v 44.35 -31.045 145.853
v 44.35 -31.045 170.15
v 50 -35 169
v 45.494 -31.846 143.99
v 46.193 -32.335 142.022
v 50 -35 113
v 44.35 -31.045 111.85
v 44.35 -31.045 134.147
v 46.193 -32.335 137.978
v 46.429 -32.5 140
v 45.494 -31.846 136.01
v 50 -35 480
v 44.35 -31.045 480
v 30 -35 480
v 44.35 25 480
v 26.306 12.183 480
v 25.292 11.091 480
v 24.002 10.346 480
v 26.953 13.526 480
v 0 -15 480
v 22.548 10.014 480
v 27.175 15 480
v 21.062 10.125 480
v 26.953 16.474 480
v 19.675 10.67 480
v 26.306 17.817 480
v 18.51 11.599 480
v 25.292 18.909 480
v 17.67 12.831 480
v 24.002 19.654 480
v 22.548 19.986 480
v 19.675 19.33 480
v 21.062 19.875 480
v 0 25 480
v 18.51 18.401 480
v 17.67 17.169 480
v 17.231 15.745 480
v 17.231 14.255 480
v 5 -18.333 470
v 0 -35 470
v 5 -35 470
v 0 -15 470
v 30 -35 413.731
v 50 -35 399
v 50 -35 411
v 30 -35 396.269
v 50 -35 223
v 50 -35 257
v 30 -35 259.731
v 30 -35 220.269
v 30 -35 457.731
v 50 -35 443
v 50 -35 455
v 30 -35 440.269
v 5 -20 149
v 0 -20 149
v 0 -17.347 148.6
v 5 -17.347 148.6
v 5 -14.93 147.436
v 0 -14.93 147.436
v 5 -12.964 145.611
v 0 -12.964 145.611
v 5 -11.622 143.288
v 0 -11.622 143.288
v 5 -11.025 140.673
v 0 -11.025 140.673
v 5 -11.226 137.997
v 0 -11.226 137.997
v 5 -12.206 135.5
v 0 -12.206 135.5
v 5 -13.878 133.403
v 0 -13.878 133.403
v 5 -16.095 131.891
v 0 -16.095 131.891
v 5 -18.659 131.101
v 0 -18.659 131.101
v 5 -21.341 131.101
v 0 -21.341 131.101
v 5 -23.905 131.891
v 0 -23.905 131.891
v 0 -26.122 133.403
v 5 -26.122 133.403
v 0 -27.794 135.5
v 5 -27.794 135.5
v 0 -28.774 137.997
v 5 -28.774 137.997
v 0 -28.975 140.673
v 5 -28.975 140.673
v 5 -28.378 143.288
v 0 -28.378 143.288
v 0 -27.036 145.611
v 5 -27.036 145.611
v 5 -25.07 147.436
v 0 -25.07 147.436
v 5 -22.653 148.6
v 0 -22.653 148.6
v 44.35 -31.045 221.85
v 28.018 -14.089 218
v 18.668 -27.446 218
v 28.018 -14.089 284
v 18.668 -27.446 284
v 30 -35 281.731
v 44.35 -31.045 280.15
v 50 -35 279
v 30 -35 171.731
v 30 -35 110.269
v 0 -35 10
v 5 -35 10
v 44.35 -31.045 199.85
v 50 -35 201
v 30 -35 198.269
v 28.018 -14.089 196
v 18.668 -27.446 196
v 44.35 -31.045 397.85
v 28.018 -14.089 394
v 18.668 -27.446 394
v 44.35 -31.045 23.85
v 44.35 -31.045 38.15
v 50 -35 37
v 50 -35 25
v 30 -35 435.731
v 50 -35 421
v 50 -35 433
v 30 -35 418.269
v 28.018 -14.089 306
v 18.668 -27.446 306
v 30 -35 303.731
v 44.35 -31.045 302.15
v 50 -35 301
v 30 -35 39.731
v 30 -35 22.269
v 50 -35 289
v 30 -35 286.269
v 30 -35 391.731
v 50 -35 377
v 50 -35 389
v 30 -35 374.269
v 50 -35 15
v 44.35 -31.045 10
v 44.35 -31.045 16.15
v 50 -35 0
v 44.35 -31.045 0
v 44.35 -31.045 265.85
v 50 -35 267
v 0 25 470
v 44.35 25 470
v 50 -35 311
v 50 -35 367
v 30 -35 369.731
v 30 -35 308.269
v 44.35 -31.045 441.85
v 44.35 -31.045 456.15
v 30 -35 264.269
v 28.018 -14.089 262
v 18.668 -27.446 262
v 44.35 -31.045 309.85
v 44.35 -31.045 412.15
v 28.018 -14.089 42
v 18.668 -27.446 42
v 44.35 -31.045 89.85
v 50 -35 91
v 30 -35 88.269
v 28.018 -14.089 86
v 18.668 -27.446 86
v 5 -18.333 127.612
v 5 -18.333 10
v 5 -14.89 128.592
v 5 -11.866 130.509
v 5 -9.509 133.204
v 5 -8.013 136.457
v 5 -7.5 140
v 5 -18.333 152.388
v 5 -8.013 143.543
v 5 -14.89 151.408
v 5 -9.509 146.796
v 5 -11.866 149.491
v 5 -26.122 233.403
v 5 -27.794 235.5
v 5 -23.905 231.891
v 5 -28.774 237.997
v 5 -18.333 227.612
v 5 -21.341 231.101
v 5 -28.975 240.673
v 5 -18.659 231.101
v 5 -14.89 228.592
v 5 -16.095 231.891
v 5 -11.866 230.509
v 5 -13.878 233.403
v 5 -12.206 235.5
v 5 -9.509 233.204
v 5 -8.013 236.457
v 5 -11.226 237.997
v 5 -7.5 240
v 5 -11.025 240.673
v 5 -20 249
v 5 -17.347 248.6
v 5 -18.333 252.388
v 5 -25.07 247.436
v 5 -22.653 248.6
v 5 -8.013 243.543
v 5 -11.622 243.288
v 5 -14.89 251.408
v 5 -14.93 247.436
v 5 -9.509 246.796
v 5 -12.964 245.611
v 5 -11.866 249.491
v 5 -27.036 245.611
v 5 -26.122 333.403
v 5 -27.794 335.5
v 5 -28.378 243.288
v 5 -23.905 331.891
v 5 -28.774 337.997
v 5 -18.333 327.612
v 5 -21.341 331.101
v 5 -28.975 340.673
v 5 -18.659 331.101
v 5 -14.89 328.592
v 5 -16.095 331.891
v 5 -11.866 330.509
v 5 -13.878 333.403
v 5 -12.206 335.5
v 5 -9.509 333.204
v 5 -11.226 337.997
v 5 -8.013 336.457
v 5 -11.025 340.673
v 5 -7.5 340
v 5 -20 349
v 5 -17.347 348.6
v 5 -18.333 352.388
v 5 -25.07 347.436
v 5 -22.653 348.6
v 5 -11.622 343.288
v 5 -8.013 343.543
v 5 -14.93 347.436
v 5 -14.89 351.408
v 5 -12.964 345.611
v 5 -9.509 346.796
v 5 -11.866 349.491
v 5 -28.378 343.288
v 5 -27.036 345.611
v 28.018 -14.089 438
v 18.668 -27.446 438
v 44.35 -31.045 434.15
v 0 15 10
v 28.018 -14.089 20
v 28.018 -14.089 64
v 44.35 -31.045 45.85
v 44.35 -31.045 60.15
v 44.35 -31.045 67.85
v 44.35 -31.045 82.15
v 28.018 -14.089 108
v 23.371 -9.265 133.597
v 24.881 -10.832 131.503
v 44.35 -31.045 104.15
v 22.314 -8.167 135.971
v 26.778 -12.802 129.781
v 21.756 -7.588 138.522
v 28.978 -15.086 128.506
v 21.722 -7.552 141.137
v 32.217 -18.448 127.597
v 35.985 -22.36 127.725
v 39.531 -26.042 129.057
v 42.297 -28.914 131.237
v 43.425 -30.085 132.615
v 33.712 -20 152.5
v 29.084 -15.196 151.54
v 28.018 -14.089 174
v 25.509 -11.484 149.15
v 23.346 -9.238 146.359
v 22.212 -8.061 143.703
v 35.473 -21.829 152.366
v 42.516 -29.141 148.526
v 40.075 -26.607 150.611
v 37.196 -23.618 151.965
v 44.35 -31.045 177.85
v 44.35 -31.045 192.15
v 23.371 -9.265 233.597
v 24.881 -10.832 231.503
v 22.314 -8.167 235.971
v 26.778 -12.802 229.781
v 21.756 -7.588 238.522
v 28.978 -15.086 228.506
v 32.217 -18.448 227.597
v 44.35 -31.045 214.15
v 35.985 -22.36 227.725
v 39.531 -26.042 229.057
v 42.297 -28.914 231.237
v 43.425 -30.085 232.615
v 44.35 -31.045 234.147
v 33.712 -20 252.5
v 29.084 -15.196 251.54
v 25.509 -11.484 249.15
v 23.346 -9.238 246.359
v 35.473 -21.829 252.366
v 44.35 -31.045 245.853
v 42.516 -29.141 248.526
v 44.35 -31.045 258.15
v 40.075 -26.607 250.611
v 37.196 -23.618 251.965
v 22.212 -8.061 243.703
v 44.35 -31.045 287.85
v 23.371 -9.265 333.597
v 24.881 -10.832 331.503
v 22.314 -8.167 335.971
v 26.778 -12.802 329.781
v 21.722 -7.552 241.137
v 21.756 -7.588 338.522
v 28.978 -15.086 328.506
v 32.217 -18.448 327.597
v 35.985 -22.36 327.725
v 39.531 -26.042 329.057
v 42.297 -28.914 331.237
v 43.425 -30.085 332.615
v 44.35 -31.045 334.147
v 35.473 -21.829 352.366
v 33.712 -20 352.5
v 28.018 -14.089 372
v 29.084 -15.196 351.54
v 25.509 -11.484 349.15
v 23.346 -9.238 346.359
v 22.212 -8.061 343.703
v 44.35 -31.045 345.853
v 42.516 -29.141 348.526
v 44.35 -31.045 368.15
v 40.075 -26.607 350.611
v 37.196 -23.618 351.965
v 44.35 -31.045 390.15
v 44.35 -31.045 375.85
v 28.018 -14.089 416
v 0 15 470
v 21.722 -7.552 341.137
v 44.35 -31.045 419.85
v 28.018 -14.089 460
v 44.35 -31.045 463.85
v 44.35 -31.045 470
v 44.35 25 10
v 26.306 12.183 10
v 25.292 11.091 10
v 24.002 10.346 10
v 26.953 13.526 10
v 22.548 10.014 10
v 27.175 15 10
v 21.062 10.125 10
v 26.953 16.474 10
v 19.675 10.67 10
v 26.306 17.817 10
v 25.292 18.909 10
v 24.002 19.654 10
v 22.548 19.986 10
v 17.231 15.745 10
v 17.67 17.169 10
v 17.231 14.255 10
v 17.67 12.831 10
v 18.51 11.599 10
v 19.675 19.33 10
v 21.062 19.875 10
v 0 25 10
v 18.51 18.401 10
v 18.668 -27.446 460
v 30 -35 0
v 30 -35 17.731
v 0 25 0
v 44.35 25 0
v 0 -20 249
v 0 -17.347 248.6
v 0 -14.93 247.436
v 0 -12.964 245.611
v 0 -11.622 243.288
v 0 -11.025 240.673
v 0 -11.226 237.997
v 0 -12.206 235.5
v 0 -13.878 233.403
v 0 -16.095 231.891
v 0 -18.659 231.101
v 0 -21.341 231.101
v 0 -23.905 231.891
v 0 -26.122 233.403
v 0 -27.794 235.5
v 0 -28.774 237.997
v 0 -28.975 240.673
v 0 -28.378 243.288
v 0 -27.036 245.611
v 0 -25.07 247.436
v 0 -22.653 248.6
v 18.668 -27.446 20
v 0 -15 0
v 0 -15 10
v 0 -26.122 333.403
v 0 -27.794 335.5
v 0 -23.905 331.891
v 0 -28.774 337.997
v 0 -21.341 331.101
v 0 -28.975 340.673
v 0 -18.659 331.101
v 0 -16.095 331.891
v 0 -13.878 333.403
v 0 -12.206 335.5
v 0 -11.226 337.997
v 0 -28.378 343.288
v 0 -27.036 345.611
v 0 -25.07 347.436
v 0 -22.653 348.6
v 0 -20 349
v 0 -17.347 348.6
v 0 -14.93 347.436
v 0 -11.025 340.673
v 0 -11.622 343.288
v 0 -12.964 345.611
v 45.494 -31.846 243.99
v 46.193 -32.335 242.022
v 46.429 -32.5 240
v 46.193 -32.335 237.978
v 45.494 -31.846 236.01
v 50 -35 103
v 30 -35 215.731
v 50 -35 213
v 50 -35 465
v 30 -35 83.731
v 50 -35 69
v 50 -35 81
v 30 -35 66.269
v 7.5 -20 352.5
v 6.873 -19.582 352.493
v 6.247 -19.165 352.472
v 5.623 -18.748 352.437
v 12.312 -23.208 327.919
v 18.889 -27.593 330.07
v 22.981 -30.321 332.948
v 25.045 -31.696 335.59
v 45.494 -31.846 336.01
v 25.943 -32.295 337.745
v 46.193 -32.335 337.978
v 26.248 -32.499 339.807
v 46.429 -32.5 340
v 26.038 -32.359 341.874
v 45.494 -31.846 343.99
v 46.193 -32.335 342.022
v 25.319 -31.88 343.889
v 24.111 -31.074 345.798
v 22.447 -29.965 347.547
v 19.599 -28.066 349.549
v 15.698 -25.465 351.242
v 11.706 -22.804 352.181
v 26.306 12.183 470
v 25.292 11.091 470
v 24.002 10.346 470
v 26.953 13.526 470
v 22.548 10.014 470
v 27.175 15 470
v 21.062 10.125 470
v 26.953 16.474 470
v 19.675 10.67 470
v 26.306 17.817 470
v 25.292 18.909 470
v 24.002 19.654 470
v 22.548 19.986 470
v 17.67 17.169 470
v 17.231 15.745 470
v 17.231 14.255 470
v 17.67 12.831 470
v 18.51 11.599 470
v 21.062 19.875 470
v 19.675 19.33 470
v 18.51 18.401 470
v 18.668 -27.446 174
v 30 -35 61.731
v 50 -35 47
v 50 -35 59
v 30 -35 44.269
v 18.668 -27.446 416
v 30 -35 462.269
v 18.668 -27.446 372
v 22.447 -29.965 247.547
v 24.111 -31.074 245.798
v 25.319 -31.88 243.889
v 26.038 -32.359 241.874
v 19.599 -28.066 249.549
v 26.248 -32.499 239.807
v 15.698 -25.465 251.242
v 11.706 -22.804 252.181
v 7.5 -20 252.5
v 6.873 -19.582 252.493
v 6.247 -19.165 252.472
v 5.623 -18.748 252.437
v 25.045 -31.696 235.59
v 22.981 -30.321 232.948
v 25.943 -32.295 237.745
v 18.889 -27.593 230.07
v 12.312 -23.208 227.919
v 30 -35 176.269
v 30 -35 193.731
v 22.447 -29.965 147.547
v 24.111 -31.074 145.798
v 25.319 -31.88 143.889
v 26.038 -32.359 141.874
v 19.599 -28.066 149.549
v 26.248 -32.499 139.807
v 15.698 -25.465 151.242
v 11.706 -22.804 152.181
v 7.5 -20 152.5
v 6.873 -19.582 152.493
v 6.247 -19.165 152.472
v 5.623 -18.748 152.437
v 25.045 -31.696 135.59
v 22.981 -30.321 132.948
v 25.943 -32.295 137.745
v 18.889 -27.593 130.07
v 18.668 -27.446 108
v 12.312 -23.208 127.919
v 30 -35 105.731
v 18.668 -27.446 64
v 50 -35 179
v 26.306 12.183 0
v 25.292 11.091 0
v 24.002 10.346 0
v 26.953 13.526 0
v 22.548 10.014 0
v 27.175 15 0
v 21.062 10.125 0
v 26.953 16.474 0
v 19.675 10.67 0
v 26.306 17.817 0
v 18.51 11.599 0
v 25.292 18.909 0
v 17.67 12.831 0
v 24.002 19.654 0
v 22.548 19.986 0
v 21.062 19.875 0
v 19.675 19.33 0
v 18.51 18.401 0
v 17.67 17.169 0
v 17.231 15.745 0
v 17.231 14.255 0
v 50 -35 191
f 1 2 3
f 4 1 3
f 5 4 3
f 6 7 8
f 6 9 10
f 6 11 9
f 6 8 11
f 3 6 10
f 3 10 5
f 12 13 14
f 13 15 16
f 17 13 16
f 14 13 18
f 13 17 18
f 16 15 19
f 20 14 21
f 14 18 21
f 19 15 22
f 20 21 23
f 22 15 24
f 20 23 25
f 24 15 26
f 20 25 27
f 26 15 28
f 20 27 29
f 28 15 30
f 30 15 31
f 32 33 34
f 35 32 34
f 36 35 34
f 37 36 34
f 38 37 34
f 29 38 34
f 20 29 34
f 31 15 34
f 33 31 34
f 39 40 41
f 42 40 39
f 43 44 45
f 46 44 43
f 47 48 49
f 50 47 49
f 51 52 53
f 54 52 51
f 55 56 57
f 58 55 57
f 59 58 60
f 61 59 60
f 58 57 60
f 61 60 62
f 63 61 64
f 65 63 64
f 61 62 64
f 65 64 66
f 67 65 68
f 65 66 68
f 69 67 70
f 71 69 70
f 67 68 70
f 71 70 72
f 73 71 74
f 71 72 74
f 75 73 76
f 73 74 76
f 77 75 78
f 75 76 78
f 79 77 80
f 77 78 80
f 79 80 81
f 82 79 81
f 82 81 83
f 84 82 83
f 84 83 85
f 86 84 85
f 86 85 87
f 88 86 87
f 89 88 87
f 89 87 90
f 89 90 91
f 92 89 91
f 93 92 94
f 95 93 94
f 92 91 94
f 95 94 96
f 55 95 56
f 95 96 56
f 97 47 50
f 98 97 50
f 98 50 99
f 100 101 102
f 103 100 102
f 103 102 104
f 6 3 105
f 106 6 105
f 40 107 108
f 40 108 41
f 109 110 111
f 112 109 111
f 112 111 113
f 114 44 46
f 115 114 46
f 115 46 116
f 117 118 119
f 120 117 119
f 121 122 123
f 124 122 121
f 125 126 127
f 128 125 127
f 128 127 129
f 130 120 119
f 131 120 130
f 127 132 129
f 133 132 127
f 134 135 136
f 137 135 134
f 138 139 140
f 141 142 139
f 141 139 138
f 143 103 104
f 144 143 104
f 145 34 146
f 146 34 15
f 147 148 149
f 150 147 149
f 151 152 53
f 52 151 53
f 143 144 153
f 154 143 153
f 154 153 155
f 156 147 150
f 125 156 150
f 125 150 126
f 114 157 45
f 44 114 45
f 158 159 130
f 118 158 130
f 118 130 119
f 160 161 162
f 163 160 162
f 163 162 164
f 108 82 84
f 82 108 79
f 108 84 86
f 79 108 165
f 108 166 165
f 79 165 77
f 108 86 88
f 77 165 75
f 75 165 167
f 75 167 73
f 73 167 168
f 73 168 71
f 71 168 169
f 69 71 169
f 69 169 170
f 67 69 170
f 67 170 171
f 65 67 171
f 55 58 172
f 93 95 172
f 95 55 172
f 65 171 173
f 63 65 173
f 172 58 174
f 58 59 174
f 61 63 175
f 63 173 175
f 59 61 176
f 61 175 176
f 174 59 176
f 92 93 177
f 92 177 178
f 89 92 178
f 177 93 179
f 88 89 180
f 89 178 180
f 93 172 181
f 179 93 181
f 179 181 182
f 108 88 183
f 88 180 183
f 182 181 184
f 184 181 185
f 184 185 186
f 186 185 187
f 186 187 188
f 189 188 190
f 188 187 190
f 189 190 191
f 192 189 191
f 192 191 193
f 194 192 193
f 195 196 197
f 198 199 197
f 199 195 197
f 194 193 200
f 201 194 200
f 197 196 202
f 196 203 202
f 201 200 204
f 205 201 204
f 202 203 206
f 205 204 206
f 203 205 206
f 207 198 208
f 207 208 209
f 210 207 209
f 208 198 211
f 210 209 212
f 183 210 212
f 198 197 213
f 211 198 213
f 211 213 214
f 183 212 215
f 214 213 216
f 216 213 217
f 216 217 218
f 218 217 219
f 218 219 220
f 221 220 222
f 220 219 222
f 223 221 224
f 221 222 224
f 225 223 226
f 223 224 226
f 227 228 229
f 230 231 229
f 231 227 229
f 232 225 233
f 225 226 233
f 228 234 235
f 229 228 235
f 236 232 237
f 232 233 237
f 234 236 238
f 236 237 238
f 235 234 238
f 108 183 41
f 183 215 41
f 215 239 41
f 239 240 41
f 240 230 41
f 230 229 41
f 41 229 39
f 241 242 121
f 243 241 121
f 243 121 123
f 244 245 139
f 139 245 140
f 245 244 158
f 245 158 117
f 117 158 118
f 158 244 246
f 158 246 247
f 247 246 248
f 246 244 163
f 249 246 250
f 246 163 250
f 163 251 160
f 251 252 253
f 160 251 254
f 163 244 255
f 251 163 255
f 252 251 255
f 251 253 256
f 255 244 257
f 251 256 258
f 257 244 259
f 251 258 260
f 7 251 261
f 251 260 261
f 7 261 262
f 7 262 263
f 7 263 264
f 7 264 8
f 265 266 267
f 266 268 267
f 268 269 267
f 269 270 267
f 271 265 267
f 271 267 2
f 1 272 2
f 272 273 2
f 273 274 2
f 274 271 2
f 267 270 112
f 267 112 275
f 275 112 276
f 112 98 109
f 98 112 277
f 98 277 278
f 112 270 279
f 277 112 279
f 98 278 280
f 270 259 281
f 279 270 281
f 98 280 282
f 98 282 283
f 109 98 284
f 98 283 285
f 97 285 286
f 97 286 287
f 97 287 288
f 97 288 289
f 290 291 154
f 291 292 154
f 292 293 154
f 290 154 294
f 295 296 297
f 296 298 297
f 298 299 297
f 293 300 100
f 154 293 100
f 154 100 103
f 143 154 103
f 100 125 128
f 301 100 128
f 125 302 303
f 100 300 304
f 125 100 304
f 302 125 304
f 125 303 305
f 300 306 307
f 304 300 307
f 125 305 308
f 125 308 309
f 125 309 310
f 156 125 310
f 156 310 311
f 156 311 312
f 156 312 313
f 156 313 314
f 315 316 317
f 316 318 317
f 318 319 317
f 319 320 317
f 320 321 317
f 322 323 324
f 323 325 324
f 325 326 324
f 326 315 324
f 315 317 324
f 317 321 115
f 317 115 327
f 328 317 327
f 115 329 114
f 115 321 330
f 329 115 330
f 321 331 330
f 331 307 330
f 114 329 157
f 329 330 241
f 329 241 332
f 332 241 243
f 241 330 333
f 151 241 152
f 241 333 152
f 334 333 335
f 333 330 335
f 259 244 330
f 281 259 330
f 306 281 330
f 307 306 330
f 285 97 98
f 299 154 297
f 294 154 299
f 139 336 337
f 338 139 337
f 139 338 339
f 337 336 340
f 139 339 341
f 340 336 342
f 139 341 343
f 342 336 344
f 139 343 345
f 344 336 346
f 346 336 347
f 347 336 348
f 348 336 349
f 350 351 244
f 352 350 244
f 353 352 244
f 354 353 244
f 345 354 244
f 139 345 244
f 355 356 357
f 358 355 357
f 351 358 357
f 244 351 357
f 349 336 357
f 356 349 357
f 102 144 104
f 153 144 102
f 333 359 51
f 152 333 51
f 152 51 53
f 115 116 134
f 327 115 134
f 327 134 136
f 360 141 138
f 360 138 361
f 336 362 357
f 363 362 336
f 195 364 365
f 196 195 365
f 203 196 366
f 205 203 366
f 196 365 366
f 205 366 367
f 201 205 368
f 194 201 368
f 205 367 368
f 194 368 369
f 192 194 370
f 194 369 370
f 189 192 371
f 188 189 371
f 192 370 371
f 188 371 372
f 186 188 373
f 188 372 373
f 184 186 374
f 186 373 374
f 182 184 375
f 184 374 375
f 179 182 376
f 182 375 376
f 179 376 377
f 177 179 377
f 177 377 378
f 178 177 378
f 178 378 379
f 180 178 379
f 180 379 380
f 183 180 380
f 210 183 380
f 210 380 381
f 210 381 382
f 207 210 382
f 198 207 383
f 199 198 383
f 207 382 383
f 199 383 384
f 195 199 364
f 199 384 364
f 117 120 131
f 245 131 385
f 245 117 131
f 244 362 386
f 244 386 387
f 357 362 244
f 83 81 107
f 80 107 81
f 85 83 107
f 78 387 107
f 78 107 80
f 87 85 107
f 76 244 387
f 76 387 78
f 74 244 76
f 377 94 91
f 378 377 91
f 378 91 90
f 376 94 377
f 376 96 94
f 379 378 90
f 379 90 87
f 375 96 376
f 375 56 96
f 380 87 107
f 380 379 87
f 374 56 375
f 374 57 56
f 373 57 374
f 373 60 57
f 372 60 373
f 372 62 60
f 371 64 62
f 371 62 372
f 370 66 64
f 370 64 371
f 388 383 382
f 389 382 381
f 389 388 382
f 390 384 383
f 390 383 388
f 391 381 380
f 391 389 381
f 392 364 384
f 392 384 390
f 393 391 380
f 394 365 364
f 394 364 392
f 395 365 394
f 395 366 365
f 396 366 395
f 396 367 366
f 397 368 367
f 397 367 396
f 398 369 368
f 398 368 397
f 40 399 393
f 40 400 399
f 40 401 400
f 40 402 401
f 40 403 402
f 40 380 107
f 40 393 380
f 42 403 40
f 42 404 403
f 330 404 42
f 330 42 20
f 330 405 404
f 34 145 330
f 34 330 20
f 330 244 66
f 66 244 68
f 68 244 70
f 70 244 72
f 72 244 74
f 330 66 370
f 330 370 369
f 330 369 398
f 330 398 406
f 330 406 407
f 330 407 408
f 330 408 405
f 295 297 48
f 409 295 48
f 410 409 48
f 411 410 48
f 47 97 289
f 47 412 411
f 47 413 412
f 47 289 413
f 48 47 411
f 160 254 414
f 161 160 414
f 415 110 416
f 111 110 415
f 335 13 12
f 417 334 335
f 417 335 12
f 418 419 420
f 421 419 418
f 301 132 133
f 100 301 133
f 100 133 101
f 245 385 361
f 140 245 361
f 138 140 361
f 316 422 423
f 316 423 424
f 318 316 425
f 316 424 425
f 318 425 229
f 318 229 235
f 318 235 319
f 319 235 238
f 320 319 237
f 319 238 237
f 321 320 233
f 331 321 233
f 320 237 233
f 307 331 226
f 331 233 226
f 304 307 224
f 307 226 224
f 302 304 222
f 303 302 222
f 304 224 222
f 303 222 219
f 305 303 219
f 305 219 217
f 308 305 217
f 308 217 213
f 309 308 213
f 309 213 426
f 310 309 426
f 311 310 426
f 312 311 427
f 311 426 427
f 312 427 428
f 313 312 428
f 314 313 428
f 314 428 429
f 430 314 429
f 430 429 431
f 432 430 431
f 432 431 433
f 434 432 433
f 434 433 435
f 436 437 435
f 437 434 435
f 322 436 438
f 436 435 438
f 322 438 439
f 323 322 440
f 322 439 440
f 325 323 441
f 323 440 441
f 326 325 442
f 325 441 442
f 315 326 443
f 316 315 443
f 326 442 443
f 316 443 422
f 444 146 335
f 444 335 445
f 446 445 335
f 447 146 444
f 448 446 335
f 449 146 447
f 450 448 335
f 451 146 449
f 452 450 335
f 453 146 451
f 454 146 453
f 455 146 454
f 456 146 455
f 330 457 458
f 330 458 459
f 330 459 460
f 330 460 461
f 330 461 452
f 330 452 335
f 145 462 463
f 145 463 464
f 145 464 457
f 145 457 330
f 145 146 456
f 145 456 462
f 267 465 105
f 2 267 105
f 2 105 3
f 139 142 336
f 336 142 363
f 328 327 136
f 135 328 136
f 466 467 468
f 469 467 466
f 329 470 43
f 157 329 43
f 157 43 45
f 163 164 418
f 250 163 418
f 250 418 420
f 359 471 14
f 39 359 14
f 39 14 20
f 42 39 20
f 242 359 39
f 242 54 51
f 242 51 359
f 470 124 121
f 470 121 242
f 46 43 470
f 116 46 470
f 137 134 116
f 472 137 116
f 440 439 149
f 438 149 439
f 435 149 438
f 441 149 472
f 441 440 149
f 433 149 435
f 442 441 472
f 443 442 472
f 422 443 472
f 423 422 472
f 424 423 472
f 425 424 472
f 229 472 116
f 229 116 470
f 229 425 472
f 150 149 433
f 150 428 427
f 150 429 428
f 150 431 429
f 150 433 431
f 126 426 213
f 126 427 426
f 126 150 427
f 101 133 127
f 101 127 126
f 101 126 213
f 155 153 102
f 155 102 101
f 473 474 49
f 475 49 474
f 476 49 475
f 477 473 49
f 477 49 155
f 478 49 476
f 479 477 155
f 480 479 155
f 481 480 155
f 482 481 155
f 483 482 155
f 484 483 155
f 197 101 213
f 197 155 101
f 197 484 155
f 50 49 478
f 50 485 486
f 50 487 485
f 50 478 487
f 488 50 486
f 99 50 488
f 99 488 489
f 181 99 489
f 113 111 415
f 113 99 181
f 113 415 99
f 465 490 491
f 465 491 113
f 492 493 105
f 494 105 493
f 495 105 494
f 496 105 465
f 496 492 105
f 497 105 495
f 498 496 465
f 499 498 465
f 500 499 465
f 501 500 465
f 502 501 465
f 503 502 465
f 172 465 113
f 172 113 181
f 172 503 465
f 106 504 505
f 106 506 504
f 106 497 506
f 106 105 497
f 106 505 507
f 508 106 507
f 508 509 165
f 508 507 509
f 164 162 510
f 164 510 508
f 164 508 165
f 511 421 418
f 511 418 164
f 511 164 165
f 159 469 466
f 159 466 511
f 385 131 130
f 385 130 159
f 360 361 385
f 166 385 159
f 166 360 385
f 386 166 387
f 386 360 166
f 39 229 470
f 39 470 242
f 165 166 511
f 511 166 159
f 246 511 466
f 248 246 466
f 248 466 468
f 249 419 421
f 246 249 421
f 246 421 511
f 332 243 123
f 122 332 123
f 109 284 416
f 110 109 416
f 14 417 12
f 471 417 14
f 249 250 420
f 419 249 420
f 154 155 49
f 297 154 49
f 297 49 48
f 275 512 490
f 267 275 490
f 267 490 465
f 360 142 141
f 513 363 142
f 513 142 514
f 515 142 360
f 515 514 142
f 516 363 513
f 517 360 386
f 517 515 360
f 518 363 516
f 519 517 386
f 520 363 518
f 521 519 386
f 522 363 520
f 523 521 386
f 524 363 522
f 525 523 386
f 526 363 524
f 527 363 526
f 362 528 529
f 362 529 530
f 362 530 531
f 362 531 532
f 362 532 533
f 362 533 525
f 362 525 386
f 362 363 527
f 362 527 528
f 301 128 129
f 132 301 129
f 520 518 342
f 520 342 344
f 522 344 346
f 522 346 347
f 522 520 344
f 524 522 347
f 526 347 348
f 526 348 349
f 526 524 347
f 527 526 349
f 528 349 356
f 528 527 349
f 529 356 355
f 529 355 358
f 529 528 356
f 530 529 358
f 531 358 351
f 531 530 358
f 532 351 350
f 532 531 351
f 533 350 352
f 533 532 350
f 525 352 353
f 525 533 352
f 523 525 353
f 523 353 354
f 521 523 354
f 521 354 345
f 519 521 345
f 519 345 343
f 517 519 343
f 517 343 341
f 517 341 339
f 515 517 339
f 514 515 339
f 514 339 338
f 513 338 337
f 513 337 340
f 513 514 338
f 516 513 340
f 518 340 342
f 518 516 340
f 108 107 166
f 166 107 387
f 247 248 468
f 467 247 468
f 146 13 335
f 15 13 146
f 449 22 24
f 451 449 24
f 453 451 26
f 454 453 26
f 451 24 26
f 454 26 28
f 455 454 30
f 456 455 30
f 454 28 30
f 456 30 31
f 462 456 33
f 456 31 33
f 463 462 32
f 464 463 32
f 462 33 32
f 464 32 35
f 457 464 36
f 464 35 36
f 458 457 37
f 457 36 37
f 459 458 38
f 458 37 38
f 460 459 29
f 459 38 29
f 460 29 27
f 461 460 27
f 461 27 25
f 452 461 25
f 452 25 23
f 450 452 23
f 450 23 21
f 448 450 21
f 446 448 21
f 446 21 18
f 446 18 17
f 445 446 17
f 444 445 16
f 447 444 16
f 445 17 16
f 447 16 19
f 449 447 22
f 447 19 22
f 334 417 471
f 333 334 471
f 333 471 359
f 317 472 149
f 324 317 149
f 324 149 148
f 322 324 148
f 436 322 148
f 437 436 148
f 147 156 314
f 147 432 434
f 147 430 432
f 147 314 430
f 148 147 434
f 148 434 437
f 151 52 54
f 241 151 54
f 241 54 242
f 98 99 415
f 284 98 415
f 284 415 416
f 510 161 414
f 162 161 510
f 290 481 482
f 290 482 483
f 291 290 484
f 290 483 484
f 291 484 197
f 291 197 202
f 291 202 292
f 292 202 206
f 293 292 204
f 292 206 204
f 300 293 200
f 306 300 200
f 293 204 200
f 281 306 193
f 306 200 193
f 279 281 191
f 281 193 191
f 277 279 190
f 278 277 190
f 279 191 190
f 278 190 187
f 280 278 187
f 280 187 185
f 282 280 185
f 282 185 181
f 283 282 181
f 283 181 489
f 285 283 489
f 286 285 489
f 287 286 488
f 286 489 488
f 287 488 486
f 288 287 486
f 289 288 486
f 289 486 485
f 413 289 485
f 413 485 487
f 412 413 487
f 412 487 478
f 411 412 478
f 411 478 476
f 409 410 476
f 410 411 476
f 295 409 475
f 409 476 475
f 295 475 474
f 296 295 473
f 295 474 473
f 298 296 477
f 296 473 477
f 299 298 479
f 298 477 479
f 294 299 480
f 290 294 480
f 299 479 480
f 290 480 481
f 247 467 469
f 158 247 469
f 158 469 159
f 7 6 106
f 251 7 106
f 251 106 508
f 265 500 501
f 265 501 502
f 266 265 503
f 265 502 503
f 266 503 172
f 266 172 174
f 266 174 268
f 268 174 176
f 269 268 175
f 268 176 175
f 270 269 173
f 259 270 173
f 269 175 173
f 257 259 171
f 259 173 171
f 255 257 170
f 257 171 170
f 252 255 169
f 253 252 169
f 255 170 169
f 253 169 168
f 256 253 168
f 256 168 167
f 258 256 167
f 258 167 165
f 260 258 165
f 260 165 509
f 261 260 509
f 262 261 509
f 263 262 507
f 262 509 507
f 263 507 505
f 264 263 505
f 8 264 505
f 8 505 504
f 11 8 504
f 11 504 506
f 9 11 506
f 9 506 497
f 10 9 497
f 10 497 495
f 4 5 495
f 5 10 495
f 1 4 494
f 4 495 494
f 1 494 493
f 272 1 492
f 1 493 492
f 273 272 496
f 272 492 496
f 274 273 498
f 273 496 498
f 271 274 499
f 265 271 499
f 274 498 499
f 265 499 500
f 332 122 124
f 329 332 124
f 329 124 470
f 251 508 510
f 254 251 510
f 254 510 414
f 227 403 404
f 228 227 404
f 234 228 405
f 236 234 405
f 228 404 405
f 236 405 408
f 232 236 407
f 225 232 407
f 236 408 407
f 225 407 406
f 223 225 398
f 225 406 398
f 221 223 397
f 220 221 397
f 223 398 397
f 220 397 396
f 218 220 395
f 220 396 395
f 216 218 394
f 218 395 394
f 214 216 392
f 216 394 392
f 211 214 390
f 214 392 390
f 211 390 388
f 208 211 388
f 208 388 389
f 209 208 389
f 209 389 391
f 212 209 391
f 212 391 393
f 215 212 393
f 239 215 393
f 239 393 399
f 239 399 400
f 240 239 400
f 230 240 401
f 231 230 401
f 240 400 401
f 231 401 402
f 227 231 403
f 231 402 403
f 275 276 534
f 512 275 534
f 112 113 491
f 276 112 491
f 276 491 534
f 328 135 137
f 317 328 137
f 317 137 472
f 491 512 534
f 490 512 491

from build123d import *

# Parameters (mm, degrees)
BOSS_EXTRUDE1_DEPTH = 480
SKETCH2_R           = 5
BOSS_EXTRUDE2_DEPTH = 10
BOSS_EXTRUDE3_REACH = 482
CUT_EXTRUDE9_DEPTH  = 28
SKETCH14_W          = 460
SKETCH14_H          = 35
BOSS_EXTRUDE6_DEPTH = 5
SKETCH7_R           = 12.5
CUT_EXTRUDE8_DEPTH  = 56
SKETCH15_R          = 12.5
SKETCH15_R_2        = 9
BOSS_EXTRUDE7_DEPTH = 5


with BuildPart() as part:
    # Sketch1 → Boss-Extrude1 (new body)
    with BuildSketch(Plane.XY):
        Polygon((0, 0), (50, -35), (30, -35), (0, -15), align=None)
    extrude(amount=BOSS_EXTRUDE1_DEPTH)

    # Sketch2 → Boss-Extrude2 (add)
    with BuildSketch(Plane.XY.offset(480)):
        Polygon((0, -15), (0, 25), (44.349659334, 25), (44.349659334, -15), (44.349659334, -35), (30, -35), align=None)
        with Locations((22.174829667, 15)):
            Circle(SKETCH2_R, mode=Mode.SUBTRACT)
    boss_extrude2 = extrude(amount=-BOSS_EXTRUDE2_DEPTH)

    # Mirror1: Boss-Extrude2 across plane
    add(boss_extrude2.mirror(Plane.XY.offset(240)))

    # Sketch4 → Boss-Extrude3 (add, up to next)
    with BuildSketch(Plane.XY.offset(480), mode=Mode.PRIVATE) as boss_extrude3_sk1:
        Polygon((0, 0), (0, 15), (44.349659334, -31.044761534), align=None)
    boss_extrude3_tool1 = extrude(boss_extrude3_sk1.sketch, amount=-BOSS_EXTRUDE3_REACH, mode=Mode.PRIVATE) - part.part
    add(boss_extrude3_tool1.solids().sort_by_distance((14.78322, -5.348254, 480))[0])

    # Sketch3 → Cut-Extrude9 (cut, symmetric)
    with BuildSketch(Plane(origin=(0, 0, 0), x_dir=(0.819231921, -0.573462344, 0), z_dir=(0.573462344, 0.819231921, 0))):
        Polygon((61.032778079, -465), (31.032778079, -460), (61.032778079, -455), align=None)
        Polygon((61.032778079, -443), (31.032778079, -438), (61.032778079, -433), align=None)
        Polygon((61.032778079, -421), (31.032778079, -416), (61.032778079, -411), align=None)
        Polygon((61.032778079, -399), (31.032778079, -394), (61.032778079, -389), align=None)
        Polygon((61.032778079, -377), (31.032778079, -372), (61.032778079, -367), align=None)
        Polygon((61.032778079, -311), (31.032778079, -306), (61.032778079, -301), align=None)
        Polygon((61.032778079, -289), (31.032778079, -284), (61.032778079, -279), align=None)
        Polygon((61.032778079, -267), (31.032778079, -262), (61.032778079, -257), align=None)
        Polygon((61.032778079, -223), (31.032778079, -218), (61.032778079, -213), align=None)
        Polygon((61.032778079, -201), (31.032778079, -196), (61.032778079, -191), align=None)
        Polygon((61.032778079, -179), (31.032778079, -174), (61.032778079, -169), align=None)
        Polygon((61.032778079, -113), (31.032778079, -108), (61.032778079, -103), align=None)
        Polygon((61.032778079, -91), (31.032778079, -86), (61.032778079, -81), align=None)
        Polygon((61.032778079, -69), (31.032778079, -64), (61.032778079, -59), align=None)
        Polygon((61.032778079, -47), (31.032778079, -42), (61.032778079, -37), align=None)
        Polygon((61.032778079, -25), (31.032778079, -20), (61.032778079, -15), align=None)
    extrude(amount=CUT_EXTRUDE9_DEPTH, both=True, mode=Mode.SUBTRACT)

    # Sketch14 → Boss-Extrude6 (add)
    with BuildSketch(Plane.ZY):
        with Locations((240, -17.5)):
            Rectangle(SKETCH14_W, SKETCH14_H)
    extrude(amount=-BOSS_EXTRUDE6_DEPTH)

    # Sketch7 → Cut-Extrude8 (cut)
    with BuildSketch(Plane.ZY):
        with Locations((240, -20)):
            Circle(SKETCH7_R)
        with Locations((340, -20)):
            Circle(SKETCH7_R)
        with Locations((140, -20)):
            Circle(SKETCH7_R)
    extrude(amount=-CUT_EXTRUDE8_DEPTH, mode=Mode.SUBTRACT)

    # Sketch15 → Boss-Extrude7 (add)
    with BuildSketch(Plane.ZY):
        with Locations((340, -20)):
            Circle(SKETCH15_R)
        with Locations((340, -20)):
            Circle(SKETCH15_R_2, mode=Mode.SUBTRACT)
        with Locations((240, -20)):
            Circle(SKETCH15_R)
        with Locations((240, -20)):
            Circle(SKETCH15_R_2, mode=Mode.SUBTRACT)
        with Locations((140, -20)):
            Circle(SKETCH15_R)
        with Locations((140, -20)):
            Circle(SKETCH15_R_2, mode=Mode.SUBTRACT)
    extrude(amount=-BOSS_EXTRUDE7_DEPTH)


solid = part.part
